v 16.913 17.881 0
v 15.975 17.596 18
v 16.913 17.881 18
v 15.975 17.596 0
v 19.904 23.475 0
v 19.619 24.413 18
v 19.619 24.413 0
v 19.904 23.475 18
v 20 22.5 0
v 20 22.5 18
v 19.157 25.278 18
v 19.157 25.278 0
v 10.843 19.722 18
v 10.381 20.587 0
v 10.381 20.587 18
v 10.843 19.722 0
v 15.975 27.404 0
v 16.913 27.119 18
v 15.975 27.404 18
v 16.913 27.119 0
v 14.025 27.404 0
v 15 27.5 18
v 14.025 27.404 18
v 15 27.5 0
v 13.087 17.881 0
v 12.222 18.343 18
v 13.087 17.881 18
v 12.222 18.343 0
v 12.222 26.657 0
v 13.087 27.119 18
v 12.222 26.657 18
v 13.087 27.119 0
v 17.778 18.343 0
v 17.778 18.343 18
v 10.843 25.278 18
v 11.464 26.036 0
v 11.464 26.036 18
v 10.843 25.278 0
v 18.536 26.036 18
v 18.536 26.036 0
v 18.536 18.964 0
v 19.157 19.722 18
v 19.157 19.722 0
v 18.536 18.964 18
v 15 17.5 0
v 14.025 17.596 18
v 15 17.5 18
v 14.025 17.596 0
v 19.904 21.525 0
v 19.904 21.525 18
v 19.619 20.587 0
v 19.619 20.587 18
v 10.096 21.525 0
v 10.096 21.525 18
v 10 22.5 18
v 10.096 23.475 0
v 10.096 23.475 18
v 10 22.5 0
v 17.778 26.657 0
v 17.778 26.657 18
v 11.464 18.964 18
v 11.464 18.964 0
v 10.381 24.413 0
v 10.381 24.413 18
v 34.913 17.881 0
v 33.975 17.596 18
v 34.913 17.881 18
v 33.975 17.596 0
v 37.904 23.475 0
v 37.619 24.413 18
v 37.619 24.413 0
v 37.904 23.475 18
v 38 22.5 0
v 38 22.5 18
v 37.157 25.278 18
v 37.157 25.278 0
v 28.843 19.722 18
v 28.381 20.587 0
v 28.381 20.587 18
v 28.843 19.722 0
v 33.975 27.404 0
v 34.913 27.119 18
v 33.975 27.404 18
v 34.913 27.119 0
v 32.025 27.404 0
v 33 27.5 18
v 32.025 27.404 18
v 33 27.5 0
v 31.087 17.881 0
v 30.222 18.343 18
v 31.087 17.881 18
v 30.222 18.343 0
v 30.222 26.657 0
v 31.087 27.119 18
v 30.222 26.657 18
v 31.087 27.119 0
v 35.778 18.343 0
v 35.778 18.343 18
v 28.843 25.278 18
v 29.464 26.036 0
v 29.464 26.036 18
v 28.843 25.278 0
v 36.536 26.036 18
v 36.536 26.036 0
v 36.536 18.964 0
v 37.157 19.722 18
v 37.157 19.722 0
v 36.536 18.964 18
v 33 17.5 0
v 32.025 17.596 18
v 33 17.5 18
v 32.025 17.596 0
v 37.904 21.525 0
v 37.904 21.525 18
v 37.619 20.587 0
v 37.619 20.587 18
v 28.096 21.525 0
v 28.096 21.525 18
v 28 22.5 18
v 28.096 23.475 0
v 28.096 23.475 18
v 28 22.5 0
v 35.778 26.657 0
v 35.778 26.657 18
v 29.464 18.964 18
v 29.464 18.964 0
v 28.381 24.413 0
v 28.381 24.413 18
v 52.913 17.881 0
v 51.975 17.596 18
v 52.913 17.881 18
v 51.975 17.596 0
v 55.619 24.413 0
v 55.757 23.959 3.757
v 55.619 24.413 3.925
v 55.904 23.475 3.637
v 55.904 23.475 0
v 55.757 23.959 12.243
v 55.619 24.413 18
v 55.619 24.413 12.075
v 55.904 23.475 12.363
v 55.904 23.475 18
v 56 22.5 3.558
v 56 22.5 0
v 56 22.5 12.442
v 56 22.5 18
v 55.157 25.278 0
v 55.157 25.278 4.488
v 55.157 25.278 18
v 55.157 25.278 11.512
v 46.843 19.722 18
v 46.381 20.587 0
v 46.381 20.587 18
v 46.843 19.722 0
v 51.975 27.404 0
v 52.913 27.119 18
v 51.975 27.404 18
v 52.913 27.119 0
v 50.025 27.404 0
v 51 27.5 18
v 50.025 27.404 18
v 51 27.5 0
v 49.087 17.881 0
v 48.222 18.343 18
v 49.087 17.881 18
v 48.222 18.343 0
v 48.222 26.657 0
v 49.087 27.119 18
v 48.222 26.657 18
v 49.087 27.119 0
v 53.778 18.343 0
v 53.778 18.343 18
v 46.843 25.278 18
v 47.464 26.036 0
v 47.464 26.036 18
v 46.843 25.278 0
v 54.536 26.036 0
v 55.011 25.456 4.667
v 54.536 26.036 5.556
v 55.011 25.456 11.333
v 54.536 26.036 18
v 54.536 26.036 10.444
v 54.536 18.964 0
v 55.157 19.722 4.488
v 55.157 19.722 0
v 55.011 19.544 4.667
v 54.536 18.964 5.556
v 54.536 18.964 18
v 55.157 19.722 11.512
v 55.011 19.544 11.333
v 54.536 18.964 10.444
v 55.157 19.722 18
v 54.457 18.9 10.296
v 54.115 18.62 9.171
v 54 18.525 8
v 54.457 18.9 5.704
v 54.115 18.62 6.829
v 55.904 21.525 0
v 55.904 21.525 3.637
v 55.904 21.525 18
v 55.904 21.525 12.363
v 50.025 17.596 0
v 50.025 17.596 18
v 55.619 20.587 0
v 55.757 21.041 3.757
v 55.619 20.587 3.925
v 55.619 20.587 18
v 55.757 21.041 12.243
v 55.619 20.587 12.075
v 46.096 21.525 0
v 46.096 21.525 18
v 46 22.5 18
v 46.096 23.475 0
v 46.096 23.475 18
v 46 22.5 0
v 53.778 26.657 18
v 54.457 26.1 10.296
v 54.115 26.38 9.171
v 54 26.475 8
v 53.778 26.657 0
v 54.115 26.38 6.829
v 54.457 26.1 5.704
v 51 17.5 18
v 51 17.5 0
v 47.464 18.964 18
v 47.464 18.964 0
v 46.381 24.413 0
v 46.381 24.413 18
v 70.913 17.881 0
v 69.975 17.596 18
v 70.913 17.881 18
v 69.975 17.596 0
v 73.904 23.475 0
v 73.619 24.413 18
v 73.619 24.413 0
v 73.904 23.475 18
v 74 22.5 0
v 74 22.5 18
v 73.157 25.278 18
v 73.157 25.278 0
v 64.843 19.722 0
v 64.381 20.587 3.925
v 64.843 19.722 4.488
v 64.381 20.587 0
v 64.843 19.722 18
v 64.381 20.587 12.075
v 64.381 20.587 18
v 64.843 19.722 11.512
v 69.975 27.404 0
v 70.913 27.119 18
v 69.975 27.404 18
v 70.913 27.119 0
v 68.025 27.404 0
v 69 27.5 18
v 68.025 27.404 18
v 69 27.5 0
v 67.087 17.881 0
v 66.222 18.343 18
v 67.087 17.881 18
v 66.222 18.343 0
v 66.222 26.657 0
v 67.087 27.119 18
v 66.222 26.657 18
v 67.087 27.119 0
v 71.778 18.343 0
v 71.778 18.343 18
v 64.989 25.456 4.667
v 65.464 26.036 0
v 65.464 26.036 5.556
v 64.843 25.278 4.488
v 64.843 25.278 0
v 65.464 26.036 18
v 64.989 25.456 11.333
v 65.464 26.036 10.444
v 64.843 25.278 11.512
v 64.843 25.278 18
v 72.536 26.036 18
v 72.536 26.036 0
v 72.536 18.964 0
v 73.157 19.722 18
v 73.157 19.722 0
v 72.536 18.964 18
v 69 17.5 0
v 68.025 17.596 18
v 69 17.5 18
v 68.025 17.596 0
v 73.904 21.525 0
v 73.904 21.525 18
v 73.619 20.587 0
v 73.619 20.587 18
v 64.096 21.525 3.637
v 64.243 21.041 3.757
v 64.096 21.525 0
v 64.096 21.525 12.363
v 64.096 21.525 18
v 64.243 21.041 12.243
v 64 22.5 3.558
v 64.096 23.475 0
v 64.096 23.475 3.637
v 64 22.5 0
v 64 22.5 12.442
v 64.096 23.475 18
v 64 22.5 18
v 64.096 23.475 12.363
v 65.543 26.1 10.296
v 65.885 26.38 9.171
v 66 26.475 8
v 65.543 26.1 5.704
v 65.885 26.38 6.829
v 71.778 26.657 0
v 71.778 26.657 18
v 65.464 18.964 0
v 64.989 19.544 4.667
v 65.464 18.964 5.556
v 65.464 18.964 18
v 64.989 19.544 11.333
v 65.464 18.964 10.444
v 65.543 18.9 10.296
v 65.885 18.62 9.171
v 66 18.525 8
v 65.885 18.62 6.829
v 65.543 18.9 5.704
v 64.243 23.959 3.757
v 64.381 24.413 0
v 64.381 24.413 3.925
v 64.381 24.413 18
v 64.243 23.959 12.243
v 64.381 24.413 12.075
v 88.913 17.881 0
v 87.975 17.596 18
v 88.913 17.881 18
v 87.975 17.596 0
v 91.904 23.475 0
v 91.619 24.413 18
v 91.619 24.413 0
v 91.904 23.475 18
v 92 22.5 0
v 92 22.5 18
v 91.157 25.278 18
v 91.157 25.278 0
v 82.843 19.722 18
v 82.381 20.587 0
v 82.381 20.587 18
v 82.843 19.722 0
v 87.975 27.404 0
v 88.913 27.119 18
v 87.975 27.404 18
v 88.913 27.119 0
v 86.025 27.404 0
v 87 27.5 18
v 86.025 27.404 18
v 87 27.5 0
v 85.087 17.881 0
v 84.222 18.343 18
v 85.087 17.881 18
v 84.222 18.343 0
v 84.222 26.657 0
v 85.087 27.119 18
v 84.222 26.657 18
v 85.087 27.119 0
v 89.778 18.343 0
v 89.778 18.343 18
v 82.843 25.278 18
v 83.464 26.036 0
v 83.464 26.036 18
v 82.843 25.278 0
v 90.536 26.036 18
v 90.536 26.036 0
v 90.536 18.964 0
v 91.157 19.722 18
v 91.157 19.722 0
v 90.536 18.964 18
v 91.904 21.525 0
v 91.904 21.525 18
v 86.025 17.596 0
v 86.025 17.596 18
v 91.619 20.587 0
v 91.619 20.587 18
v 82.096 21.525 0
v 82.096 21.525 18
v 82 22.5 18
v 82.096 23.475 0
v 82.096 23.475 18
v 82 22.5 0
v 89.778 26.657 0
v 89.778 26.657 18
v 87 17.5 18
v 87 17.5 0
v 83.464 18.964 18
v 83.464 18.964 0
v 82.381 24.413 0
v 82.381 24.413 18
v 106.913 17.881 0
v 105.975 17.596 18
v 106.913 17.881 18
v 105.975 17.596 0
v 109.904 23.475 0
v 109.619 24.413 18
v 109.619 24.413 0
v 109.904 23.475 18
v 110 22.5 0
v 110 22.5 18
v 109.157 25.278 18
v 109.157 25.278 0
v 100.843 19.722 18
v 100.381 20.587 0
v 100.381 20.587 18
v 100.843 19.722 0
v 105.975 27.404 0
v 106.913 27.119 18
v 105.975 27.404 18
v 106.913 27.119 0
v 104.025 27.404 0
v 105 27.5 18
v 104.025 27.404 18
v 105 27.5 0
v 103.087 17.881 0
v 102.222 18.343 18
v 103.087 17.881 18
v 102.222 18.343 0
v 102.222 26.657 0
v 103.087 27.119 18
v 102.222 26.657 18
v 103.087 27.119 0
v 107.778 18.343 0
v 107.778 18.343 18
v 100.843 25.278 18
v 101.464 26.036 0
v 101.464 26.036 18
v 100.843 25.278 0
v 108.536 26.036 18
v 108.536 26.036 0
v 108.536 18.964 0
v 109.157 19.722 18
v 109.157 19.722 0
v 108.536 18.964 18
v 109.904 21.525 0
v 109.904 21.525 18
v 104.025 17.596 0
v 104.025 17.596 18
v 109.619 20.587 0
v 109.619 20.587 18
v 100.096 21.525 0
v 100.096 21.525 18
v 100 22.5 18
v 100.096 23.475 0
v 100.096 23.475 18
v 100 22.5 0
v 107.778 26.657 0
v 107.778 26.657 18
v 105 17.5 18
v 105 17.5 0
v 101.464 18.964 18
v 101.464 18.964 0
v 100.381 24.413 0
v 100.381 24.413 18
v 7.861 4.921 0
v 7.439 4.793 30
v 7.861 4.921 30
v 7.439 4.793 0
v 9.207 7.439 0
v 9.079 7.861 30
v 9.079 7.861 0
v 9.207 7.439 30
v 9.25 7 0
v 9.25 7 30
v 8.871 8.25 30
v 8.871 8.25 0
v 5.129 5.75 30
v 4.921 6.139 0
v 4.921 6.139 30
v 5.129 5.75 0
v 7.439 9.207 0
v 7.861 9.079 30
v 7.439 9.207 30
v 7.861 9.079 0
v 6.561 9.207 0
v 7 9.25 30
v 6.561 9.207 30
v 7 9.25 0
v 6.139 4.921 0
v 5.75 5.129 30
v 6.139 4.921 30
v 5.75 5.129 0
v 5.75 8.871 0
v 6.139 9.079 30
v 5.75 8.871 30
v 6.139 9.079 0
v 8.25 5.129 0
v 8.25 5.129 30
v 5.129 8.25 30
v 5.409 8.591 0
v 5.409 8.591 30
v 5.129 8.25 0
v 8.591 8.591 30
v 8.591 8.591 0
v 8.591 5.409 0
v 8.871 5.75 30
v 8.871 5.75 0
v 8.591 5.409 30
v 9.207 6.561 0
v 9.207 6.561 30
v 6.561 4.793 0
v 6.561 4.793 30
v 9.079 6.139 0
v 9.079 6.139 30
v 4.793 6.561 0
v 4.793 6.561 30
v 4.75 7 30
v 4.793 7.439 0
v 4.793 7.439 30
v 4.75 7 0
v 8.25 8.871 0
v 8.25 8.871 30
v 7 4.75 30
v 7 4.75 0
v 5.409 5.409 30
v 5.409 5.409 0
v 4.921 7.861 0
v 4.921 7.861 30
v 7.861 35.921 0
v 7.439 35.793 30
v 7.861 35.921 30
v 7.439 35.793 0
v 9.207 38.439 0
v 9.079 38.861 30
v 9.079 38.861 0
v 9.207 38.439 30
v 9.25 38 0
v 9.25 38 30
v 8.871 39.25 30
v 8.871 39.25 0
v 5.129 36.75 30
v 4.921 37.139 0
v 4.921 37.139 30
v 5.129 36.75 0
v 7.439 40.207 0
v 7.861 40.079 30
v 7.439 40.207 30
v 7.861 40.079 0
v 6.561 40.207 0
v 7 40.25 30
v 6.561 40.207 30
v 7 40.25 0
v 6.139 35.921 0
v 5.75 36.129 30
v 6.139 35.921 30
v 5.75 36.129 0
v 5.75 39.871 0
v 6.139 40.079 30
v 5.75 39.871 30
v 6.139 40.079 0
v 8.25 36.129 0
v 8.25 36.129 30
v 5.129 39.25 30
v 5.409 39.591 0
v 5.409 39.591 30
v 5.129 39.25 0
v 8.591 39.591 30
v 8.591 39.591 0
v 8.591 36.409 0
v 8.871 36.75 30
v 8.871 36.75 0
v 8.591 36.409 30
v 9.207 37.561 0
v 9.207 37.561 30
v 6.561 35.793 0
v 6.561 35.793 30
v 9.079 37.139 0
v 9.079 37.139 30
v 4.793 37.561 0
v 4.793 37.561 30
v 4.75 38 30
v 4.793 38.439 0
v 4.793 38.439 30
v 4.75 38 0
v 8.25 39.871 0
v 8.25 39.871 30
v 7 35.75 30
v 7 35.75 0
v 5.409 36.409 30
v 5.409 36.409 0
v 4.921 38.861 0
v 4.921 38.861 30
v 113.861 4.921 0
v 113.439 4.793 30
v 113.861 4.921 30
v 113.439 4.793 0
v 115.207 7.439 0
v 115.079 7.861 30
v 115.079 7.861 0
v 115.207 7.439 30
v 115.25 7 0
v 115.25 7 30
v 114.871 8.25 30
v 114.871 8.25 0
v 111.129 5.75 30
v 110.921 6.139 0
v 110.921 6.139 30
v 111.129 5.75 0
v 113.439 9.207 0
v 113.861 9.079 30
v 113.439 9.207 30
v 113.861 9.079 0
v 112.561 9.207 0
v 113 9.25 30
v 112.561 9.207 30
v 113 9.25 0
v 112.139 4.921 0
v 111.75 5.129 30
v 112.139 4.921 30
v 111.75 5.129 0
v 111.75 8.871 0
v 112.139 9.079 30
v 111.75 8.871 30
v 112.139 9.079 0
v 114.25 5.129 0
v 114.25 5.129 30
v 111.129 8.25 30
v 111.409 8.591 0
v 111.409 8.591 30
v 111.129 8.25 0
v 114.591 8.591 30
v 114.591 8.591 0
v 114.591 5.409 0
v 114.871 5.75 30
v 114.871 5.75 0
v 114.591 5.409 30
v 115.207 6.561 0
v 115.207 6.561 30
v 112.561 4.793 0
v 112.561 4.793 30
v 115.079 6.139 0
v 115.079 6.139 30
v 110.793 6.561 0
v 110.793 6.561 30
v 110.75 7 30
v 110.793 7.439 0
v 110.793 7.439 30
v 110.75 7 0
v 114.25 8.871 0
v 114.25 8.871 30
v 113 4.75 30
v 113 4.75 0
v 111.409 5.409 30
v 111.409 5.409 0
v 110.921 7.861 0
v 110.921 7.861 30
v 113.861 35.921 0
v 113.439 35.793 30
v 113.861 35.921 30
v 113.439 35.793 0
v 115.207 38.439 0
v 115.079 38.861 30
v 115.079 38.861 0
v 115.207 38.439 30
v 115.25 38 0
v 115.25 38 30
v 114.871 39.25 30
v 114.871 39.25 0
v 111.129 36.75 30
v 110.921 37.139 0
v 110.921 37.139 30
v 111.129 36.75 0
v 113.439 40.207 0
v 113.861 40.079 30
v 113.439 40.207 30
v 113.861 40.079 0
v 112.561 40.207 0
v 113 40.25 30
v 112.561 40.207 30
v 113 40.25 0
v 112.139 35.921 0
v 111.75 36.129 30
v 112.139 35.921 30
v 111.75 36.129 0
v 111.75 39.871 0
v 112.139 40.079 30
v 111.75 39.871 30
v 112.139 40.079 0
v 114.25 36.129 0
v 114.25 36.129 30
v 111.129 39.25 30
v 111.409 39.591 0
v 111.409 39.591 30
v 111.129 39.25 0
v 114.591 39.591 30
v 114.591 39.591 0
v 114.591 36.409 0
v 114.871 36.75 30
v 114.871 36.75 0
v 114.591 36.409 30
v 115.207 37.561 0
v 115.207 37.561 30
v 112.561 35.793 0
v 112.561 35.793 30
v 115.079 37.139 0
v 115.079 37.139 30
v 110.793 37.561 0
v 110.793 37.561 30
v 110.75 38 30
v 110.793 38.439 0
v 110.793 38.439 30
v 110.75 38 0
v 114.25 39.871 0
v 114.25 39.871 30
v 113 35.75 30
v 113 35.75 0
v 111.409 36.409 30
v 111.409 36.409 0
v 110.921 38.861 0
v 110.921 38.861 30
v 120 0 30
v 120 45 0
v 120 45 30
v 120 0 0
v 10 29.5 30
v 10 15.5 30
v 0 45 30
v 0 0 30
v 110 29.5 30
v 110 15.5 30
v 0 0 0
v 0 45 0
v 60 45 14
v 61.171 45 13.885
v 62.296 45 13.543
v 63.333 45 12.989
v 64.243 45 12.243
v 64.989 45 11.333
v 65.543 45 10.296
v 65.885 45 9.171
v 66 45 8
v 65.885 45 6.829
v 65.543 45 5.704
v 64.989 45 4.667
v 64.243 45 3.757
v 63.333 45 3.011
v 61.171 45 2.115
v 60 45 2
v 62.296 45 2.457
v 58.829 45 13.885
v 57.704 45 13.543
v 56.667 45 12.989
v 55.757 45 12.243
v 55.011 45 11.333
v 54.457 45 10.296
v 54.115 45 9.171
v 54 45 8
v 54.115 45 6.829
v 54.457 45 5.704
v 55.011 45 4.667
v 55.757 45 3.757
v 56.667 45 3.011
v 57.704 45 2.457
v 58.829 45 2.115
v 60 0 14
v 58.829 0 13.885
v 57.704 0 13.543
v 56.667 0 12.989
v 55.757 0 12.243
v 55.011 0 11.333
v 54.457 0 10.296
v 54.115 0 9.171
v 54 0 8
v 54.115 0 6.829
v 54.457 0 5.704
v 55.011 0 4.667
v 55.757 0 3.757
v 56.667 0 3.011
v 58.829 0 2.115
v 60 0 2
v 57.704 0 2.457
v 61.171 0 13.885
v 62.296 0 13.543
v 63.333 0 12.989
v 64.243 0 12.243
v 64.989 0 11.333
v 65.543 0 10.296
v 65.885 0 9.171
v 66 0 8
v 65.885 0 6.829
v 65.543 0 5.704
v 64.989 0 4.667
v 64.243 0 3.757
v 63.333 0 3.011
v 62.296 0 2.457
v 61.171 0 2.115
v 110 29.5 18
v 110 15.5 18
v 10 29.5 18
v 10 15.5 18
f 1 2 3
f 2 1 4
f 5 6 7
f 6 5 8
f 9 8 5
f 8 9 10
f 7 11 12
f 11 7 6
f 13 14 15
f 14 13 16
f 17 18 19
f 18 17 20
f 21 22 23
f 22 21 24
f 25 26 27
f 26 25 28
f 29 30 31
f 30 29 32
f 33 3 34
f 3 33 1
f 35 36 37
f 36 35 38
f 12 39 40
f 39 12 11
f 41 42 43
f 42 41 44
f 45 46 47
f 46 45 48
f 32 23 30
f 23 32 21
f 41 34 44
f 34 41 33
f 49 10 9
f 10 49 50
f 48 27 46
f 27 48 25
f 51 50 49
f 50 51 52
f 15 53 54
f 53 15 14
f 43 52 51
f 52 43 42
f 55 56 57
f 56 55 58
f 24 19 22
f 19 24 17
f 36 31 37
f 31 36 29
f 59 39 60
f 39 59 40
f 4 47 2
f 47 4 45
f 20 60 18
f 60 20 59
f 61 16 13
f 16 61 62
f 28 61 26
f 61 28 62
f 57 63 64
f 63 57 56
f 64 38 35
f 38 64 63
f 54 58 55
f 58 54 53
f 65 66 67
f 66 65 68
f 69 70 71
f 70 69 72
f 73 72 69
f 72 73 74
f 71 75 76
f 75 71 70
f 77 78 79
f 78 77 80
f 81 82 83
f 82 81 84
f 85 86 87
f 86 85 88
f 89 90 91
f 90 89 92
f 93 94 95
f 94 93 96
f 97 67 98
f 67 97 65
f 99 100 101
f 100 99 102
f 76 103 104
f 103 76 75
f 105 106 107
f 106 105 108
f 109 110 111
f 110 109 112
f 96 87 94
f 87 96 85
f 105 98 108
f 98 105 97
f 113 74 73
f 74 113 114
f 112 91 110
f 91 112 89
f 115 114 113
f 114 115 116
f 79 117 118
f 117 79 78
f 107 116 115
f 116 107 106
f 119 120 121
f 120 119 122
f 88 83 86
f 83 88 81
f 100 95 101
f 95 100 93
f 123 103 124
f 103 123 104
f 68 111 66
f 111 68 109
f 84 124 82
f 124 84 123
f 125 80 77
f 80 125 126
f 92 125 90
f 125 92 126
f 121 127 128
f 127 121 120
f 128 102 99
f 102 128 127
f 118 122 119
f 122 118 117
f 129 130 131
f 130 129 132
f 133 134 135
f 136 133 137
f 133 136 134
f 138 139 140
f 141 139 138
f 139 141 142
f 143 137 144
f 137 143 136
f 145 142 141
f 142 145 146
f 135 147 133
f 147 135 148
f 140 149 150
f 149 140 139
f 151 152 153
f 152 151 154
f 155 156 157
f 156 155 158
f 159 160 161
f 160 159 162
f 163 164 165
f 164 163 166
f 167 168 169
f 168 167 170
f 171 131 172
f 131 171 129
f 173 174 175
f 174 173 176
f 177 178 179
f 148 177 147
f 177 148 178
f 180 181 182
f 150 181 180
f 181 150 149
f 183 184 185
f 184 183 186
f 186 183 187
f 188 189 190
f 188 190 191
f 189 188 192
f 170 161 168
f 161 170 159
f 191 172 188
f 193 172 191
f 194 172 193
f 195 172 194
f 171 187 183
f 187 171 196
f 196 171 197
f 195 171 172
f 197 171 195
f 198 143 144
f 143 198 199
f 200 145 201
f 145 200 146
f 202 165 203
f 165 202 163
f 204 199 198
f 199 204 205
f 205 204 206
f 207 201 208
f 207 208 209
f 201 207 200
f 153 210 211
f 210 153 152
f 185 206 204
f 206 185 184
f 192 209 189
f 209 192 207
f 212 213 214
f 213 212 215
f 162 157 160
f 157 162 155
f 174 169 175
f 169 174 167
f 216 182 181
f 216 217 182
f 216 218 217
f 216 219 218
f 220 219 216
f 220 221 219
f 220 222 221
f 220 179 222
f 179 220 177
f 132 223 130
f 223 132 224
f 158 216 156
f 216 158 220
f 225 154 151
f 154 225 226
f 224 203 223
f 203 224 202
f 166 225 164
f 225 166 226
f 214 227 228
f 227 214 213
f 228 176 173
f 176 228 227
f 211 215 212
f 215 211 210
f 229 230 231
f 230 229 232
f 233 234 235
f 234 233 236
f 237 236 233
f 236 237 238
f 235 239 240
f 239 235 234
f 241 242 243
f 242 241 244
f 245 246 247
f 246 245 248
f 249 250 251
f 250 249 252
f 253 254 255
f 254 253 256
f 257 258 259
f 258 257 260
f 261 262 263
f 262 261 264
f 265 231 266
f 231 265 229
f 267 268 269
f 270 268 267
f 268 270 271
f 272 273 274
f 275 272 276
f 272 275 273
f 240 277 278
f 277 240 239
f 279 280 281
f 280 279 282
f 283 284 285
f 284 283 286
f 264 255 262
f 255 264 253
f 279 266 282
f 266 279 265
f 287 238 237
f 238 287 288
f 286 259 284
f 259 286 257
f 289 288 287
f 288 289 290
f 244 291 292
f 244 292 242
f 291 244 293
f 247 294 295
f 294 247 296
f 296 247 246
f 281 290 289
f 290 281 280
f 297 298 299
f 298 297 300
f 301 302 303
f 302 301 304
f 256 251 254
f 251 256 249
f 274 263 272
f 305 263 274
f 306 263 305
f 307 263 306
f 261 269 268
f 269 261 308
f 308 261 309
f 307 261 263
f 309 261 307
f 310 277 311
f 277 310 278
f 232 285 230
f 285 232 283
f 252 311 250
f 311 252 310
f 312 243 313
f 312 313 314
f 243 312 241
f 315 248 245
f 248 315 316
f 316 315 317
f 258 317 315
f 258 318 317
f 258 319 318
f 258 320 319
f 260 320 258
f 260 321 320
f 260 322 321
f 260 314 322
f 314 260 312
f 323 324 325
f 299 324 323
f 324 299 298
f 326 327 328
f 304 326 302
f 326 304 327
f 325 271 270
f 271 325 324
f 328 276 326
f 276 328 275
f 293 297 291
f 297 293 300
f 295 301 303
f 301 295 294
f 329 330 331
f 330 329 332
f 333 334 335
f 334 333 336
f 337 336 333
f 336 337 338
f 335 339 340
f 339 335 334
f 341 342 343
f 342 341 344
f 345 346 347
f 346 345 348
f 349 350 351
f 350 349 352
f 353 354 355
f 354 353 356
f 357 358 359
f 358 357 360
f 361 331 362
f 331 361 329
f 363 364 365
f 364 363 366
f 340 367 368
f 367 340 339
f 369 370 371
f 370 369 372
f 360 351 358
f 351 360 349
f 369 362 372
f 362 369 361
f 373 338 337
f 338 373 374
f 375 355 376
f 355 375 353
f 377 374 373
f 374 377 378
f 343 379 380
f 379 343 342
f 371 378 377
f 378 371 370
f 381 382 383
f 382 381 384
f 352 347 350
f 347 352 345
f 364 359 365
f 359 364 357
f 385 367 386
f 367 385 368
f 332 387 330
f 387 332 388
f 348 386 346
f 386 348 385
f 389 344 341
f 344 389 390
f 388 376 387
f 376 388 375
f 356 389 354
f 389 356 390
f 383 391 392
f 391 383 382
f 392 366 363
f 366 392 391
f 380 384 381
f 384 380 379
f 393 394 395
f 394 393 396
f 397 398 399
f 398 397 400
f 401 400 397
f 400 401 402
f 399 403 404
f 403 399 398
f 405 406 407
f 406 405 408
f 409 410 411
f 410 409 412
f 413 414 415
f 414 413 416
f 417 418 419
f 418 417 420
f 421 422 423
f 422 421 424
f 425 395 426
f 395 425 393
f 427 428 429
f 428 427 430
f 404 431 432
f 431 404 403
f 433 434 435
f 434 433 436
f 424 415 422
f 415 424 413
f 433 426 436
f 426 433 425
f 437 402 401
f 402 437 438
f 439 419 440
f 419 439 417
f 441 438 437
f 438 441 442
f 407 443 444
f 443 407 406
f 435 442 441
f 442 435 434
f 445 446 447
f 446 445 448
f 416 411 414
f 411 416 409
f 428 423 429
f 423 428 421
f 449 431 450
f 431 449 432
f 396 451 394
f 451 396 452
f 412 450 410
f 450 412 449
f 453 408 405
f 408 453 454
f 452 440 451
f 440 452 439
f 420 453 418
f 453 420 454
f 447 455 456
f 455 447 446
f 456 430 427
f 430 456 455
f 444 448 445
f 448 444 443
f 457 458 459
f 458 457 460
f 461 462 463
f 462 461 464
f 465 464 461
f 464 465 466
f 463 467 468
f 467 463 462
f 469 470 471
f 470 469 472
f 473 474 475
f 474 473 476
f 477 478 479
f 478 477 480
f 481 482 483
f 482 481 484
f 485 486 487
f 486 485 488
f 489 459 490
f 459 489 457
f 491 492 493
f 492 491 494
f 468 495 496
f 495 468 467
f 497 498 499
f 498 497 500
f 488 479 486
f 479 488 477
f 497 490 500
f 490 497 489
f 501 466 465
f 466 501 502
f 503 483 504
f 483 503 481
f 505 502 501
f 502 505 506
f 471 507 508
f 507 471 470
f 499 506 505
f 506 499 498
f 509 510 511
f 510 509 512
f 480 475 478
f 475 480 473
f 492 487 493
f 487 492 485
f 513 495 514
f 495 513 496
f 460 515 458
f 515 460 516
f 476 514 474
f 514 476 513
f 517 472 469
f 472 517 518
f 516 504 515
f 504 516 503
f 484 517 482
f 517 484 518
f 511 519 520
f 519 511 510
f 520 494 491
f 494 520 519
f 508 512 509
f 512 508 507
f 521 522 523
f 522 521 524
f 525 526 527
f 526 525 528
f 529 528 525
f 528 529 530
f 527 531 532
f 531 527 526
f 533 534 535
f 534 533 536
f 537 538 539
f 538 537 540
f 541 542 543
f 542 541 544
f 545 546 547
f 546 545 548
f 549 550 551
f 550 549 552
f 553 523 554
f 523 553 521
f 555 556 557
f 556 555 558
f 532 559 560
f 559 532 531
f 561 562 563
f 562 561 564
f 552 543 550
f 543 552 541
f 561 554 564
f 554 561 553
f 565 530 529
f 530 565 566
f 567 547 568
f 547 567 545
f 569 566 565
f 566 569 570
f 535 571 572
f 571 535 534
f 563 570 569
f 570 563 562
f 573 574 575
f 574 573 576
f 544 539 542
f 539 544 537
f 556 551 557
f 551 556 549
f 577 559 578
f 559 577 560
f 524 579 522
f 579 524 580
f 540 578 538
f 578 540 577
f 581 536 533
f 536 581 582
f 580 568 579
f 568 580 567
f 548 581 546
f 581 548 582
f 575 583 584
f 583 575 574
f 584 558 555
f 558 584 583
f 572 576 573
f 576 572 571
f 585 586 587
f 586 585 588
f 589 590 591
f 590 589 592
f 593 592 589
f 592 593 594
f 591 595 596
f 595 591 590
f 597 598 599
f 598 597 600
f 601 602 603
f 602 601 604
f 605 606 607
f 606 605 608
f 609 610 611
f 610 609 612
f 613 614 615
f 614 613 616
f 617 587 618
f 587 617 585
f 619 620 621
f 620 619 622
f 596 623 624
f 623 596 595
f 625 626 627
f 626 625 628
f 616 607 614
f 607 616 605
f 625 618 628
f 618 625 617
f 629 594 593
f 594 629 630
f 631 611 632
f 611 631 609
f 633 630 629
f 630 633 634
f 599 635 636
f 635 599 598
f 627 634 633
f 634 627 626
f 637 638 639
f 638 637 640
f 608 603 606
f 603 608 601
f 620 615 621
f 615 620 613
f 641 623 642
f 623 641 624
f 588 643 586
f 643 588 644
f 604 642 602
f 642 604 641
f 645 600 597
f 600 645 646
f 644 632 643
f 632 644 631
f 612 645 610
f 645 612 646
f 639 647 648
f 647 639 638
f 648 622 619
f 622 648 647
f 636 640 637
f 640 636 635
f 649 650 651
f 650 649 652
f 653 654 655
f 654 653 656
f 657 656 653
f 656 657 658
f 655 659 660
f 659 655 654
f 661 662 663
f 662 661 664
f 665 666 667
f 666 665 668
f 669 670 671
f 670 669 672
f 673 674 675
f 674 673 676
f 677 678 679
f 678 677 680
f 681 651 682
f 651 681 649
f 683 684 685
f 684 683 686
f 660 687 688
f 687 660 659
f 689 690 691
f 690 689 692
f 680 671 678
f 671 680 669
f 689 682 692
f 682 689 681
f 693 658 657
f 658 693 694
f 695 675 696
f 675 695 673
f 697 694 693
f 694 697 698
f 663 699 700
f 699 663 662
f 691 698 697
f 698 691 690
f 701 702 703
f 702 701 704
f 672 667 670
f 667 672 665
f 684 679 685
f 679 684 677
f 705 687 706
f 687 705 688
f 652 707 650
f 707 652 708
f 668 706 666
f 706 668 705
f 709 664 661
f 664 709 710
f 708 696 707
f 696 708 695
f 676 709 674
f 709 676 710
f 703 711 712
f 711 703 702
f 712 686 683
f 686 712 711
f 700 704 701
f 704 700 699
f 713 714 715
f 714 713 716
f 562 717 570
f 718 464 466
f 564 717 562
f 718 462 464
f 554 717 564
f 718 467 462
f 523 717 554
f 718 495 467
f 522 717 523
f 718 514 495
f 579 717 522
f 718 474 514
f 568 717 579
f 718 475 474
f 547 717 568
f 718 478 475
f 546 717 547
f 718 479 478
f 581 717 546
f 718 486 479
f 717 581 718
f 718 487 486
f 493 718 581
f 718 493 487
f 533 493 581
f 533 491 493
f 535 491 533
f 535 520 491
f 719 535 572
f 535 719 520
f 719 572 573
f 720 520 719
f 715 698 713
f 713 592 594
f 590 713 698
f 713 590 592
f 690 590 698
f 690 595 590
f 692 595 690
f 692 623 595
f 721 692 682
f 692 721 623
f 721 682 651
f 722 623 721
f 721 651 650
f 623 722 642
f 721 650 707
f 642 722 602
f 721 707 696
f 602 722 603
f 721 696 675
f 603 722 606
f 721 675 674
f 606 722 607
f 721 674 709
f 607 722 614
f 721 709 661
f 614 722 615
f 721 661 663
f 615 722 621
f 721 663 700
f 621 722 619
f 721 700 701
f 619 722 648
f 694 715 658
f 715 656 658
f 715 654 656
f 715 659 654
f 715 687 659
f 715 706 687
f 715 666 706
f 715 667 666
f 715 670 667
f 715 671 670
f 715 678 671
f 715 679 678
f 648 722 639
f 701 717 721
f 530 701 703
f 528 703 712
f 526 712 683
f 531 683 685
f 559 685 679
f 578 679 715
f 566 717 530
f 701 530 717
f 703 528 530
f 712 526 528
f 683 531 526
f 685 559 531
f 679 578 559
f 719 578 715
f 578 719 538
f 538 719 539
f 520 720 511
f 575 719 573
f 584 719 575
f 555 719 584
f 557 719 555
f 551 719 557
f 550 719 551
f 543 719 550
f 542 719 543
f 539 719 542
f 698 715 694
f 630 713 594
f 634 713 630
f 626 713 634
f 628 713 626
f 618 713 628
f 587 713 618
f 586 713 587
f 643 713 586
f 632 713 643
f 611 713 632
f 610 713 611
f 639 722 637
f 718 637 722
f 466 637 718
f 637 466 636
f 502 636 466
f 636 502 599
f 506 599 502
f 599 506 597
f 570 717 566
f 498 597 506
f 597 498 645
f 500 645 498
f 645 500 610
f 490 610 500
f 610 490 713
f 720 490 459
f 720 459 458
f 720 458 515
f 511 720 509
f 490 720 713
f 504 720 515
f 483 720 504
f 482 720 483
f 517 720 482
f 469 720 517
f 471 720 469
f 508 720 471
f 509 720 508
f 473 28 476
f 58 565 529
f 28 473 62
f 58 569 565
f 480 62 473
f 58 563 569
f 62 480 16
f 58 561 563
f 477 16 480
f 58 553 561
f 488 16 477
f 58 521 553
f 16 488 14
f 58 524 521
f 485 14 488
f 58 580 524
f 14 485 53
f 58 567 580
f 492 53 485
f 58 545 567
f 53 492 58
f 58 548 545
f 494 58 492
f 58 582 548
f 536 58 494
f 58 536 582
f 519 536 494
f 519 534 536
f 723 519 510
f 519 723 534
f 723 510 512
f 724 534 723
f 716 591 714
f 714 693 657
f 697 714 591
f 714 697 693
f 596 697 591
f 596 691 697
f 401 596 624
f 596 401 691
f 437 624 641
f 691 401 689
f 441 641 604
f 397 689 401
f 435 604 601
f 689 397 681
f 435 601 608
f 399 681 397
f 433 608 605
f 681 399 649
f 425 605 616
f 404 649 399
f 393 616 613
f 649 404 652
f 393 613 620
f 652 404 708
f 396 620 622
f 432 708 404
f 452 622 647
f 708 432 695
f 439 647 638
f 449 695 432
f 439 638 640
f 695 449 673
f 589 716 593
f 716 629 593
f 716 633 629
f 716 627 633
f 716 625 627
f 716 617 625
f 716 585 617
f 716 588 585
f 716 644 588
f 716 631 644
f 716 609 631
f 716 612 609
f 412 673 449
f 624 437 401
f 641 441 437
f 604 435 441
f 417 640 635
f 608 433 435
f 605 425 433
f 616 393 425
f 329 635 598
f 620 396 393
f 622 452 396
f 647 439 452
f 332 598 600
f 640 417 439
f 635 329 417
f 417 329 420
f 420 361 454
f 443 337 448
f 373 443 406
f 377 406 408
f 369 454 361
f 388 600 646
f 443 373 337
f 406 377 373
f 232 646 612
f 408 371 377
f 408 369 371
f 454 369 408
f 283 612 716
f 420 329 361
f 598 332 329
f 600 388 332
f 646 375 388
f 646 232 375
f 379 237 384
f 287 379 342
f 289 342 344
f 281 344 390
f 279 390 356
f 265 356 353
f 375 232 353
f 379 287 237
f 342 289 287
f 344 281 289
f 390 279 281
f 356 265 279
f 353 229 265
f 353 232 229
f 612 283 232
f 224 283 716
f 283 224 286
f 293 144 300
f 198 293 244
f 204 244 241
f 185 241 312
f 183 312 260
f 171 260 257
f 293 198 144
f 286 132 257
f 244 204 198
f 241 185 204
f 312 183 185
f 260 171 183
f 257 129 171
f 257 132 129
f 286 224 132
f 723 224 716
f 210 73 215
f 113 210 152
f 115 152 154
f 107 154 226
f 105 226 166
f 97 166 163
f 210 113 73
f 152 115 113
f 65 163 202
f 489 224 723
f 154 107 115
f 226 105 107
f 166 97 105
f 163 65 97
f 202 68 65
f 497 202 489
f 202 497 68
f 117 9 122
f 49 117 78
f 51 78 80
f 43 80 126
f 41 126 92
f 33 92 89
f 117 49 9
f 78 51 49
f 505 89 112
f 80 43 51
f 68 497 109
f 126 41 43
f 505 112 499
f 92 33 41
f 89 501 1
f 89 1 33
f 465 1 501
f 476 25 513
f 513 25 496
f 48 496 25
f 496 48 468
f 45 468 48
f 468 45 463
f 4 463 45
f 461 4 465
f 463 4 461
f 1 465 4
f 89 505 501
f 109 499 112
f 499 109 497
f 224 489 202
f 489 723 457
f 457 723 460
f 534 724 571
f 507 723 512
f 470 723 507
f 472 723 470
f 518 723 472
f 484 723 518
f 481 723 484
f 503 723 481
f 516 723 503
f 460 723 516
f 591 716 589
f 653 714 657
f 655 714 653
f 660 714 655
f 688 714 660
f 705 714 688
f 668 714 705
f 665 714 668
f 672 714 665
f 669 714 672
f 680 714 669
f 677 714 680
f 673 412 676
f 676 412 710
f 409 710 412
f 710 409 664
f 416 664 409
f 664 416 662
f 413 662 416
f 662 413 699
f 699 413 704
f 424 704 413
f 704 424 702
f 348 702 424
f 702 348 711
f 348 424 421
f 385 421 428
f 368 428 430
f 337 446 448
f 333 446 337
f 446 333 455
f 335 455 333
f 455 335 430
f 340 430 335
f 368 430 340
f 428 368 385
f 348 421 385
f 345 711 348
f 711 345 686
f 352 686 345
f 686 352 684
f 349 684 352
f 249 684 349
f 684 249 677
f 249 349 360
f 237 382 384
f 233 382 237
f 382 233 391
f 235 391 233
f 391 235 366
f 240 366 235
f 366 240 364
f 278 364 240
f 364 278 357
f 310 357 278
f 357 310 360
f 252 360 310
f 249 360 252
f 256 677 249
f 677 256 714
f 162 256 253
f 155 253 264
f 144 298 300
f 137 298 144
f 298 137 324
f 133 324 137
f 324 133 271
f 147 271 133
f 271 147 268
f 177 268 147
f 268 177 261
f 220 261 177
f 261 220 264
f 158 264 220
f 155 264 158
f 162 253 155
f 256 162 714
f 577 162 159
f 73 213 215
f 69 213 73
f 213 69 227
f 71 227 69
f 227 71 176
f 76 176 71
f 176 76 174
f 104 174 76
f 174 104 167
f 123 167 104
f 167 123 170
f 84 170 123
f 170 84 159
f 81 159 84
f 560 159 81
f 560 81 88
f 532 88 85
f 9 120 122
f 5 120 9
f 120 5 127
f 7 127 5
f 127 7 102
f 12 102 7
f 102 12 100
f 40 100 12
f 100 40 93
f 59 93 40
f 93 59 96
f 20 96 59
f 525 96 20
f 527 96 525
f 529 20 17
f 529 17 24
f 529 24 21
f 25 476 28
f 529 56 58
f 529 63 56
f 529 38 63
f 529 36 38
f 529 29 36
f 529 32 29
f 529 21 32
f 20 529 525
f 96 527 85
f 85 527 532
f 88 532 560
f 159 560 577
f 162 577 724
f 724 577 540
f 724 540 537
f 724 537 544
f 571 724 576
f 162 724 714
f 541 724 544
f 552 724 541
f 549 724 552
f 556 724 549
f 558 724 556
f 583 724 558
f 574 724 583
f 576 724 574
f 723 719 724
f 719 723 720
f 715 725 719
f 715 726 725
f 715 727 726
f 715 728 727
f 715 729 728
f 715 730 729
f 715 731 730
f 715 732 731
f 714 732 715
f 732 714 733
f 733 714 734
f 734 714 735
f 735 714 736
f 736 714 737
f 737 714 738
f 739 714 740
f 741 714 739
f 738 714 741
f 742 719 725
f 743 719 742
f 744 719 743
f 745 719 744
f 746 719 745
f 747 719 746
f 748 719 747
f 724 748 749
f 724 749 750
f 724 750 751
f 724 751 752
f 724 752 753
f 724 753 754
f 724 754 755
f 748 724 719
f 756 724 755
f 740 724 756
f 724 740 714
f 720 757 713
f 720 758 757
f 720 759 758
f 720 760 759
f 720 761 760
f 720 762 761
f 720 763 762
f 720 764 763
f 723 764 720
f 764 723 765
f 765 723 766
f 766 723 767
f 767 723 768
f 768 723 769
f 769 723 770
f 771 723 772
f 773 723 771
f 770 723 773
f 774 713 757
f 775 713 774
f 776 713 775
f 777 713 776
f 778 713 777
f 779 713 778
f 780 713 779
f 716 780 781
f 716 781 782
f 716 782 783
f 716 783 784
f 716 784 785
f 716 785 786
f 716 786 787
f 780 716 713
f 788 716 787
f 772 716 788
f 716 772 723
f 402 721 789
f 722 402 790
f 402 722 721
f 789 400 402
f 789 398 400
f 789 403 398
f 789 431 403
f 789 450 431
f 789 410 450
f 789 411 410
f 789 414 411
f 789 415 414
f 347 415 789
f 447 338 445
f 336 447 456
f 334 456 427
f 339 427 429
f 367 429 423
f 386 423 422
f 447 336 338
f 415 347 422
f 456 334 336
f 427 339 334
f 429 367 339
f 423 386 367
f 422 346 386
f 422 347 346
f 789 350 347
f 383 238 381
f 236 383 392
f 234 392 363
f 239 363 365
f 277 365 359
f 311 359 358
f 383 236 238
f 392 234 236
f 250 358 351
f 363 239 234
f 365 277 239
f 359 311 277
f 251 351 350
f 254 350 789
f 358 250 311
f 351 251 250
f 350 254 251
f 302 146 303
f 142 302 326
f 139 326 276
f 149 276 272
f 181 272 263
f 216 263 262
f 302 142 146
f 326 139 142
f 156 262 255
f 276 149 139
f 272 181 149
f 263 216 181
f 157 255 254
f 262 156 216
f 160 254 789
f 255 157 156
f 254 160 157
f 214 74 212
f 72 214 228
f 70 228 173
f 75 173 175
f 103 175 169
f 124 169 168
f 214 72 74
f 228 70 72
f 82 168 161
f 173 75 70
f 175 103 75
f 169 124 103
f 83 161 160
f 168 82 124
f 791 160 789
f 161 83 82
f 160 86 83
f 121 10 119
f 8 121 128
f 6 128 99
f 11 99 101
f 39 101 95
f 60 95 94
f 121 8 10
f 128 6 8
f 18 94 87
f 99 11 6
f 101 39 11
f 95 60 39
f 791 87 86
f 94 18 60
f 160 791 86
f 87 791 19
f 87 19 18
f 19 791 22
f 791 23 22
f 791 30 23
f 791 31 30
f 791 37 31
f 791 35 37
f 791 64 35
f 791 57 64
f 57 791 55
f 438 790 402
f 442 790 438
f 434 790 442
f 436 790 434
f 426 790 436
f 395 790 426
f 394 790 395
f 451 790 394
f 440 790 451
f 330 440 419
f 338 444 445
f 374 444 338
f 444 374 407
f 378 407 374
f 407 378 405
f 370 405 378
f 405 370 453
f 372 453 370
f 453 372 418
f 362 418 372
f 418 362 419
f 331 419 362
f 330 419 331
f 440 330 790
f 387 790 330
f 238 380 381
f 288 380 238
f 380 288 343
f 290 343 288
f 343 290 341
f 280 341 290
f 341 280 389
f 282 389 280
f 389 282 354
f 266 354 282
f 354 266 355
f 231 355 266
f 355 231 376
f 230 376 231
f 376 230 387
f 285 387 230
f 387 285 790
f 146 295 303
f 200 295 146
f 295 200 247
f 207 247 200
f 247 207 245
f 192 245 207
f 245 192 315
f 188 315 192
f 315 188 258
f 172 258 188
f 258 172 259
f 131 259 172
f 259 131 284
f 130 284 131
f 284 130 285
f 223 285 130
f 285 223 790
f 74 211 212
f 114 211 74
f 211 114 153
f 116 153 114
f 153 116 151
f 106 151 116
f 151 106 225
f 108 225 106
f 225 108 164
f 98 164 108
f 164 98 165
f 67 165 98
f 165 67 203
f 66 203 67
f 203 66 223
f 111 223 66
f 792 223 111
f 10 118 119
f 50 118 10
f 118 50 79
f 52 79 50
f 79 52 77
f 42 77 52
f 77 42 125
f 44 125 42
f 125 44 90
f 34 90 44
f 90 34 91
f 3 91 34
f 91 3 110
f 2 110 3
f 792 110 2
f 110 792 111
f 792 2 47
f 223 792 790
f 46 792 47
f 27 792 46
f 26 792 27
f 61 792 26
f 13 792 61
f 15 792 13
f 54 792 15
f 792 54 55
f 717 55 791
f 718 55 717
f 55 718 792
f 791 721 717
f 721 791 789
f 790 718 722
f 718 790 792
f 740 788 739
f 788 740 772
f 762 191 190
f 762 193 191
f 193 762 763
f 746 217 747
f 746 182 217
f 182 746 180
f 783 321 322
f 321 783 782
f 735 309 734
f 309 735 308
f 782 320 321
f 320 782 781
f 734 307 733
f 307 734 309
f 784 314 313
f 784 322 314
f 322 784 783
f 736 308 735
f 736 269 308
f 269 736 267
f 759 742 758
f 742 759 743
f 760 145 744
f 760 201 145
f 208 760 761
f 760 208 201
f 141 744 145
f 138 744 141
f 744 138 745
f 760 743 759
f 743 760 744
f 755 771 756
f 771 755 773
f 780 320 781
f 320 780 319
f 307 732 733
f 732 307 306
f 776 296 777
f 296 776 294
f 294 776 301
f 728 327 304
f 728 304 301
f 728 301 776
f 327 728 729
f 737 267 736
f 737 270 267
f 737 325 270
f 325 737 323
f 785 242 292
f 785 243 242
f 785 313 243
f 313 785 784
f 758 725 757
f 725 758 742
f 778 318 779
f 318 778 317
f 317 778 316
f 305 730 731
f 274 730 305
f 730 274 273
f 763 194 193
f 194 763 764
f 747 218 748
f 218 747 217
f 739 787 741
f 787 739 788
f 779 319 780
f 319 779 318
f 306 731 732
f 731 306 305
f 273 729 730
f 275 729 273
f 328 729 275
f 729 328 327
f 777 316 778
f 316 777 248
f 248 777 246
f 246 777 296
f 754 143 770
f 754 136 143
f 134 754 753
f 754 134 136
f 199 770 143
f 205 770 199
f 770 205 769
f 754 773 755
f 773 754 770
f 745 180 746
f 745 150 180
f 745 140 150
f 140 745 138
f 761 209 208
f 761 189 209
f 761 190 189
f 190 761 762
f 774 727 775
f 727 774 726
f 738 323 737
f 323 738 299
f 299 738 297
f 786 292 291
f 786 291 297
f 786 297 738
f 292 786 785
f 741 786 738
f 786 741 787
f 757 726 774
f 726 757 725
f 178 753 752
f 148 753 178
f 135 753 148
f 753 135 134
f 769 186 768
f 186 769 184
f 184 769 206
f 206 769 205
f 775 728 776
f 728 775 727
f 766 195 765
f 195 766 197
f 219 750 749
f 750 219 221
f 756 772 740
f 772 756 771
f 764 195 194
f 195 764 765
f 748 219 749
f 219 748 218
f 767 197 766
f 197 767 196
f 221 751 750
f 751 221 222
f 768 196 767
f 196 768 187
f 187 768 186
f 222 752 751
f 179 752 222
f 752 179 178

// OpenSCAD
$fn = 32;

// ----------------------------------------------------------------------
// Manifold block: side_outlet manifold
// ----------------------------------------------------------------------

// --- parameters (mm) ---
block_l = 120;            // block length, X
block_w = 45;             // block width, Y
block_h = 30;             // block height, Z
port_d = 10;              // port bore diameter
port_pitch = 18;          // port pitch along X
gallery_d = 14;           // top gallery width, Y
gallery_depth = 12;       // gallery pocket depth
wall_p = 10;              // gallery end wall thickness, X
mnt_d = 4.5;              // mounting hole diameter
mnt_in = 7;               // mounting hole inset from the edges
out_d = 12;               // outlet bore diameter
out_z = 8;                // outlet axis height

n_ports = 6;  // ports in the row
port_x0 = (block_l - (n_ports - 1) * port_pitch) / 2;  // first port X

difference() {
  cube([block_l, block_w, block_h]);
  for (i = [0 : n_ports - 1])
    translate([port_x0 + i * port_pitch, block_w / 2, -1])
      cylinder(h = block_h + 2, d = port_d);
  translate([wall_p, block_w / 2 - gallery_d / 2, block_h - gallery_depth])
    cube([block_l - 2 * wall_p, gallery_d, gallery_depth + 1]);
  for (cx = [mnt_in, block_l - mnt_in])
    for (cy = [mnt_in, block_w - mnt_in])
      translate([cx, cy, -1]) cylinder(h = block_h + 2, d = mnt_d);
  translate([block_l / 2, -1, out_z]) rotate([-90, 0, 0])
    cylinder(h = block_w + 2, d = out_d);
}
